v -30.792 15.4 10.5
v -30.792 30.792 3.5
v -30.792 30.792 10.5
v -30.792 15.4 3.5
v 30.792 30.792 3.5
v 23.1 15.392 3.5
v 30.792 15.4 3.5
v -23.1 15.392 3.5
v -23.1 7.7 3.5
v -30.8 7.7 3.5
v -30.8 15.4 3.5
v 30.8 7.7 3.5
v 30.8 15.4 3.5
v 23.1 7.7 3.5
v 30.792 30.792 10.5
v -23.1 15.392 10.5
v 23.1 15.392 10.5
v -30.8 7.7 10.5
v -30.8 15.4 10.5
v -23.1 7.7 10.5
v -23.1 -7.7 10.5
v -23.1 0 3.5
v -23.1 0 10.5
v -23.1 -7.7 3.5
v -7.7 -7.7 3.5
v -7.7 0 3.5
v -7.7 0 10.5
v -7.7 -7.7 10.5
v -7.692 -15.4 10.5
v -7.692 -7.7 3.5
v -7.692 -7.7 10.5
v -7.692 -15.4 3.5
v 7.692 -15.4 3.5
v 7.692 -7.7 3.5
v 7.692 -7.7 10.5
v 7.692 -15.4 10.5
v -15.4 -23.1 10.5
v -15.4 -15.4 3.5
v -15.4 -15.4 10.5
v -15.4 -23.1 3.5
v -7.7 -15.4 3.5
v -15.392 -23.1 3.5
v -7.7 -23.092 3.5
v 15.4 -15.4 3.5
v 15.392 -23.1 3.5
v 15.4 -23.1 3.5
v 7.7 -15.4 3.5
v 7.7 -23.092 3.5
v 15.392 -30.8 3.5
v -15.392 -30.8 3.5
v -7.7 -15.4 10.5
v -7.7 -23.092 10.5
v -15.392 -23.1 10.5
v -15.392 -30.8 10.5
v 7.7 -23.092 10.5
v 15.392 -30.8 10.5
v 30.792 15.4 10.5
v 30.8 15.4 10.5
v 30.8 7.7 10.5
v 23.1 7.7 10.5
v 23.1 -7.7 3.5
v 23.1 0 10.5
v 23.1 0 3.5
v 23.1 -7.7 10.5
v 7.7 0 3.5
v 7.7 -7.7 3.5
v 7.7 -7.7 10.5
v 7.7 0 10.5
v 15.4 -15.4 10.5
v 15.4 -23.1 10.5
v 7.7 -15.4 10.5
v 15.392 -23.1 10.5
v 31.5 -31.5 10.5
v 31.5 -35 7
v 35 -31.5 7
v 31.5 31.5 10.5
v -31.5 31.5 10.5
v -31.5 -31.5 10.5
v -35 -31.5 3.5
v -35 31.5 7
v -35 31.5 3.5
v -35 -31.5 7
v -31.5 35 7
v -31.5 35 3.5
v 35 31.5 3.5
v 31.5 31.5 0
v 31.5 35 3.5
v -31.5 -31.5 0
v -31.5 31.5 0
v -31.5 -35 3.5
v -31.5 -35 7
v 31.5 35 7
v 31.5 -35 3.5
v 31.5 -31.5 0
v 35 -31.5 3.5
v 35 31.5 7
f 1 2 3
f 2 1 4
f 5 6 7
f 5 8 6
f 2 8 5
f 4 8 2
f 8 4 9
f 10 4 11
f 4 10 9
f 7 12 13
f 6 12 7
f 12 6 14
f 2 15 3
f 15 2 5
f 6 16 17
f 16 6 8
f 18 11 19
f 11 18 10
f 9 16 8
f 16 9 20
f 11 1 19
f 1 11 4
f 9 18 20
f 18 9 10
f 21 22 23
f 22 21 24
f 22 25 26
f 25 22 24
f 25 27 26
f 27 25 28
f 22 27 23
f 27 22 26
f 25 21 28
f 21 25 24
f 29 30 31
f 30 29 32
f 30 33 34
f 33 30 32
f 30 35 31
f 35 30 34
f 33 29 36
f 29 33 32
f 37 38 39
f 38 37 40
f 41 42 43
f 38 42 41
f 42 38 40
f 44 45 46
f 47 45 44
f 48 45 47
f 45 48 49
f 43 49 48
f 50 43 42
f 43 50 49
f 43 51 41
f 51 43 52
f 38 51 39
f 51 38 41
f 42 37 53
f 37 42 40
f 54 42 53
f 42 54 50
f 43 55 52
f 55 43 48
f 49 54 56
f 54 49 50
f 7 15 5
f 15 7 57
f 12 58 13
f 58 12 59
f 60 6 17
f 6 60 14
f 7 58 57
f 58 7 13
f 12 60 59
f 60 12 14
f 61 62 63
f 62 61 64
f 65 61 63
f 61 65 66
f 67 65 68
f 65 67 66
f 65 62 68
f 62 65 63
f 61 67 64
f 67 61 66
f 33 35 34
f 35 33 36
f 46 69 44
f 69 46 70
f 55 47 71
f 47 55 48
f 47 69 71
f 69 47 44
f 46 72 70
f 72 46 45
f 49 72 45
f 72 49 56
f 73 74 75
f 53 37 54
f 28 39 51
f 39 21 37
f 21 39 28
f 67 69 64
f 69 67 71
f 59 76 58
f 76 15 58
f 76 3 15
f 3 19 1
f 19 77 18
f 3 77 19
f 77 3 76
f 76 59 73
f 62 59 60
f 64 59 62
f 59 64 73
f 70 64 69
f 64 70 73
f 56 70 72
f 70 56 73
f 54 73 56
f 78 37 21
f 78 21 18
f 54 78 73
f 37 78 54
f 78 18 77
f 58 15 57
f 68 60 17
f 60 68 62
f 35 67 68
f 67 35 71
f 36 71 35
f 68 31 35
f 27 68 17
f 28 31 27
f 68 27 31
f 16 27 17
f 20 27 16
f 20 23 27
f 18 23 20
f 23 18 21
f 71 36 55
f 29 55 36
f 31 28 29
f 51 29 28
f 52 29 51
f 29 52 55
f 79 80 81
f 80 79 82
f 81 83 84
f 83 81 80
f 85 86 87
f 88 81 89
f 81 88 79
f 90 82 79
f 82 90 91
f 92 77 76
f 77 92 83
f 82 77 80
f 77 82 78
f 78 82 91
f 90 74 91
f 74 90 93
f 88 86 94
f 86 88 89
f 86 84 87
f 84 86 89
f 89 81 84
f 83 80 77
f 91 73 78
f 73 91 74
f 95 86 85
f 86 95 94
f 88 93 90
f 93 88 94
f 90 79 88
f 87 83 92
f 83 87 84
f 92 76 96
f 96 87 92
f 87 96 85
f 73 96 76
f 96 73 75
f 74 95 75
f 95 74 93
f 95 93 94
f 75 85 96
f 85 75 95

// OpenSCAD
// file: common.scad
// Unless otherwise specified, each resulting shape is
// resting on the XY plane, centered on the Z axis.

// A small amount to make sure shapes overlap when needed. This
// is well below the resolution of my 3D printer, so it
// shouldn't affect the final result.
eps = 0.001;

// High quality for printing.
$fa = 5;
$fs = 0.4;

module repeatx(n, spacing) {
  for (i = [1:n])
    translate([(i-1)*spacing, 0, 0])
      children();
}

module repeaty(n, spacing) {
  for (i = [1:n])
    translate([0, (i-1)*spacing, 0])
      children();
}

// A square pyramid, 1mm wide and 0.5mm tall. Each side of
// the base is centered on an axis.
module pyramid() {
  linear_extrude(0.5, scale=0)
    square(1, center=true);
}

// A regular octahedron centered on the origin with its
// vertices on the axes. 'axis' gives its full length along
// each axis.
module octahedron(axis) {
  // Top and bottom halves.
  for (a = [-1, 1])
    scale([1, 1, a])
      // Extrude a square into a pyramid.
      linear_extrude(axis/2, scale=0)
        rotate([0, 0, 45])
          square(norm([axis/2, axis/2]), center=true);
}

// 'd' is the outer dimensions of the box.
module chamfered_box(d, chamfer=0.5) {
  assert(d.x >= chamfer*2);
  assert(d.y >= chamfer*2);
  assert(d.z >= chamfer*2);

  // Raise the result up so it is resting on the XY plane.
  translate([0, 0, d.z/2]) {
    minkowski() {
      // The desired cube, scaled back by the chamfer distance
      // in all directions.
      cube(d - [chamfer*2, chamfer*2, chamfer*2], center=true);
      octahedron(chamfer*2);
    }
  }
}

module chamfered_disk(height, radius) {
  // Chamfer base disks and chips more aggressively.
  chamfer = 1.1;
  assert(radius >= chamfer);
  assert(height >= chamfer*2);

  // Raise the result up so it is resting on the XY plane.
  translate([0, 0, height/2]) {
    minkowski() {
      // The desired disk, scaled back by the chamfer distance
      // in all directions.
      cylinder(height-chamfer*2, r=radius-chamfer, center=true);
      
      // A pair of cones.
      for (a = [-1, 1])
        scale([1, 1, a])
          linear_extrude(chamfer, scale=0)
            circle(chamfer);
    }
  }
}

locking_lug_dims = [2.3, 2.3, 1.8+2*eps];

// A snug fit for gluing.
module locking_lug() {
  // Taper the lug slightly, to counteract the printing effect
  // which spreads the top layer slightly.
  linear_extrude(locking_lug_dims.z, scale=0.95)
    square([locking_lug_dims.x, locking_lug_dims.y],
            center=true);
}

// Make extra sure the lug will fit all the way into the hole.
locking_socket_extra_depth = 0.7;

module locking_socket_top() {
  extra_depth = 0.15;
  translate([
    0, 0,
    -(
       locking_lug_dims.z+locking_socket_extra_depth+extra_depth
    )/2+eps
  ]) {
    cube(locking_lug_dims + [
      0.15, 0.15,
      locking_socket_extra_depth+extra_depth
    ], center=true);
  }
}

module locking_socket_bottom() {
  translate([
    0, 0,
    (locking_lug_dims.z+locking_socket_extra_depth)/2-eps
  ]) {
    cube(locking_lug_dims + [
      // When printing this on the bottom of a model, it
      // needs to be a bit wider to account for
      // elephant-foot.
      0.3, 0.3,
      locking_socket_extra_depth
    ], center=true);
  }
}

// A pin which can be used to join two locking sockets.
module locking_pin() {
  dims = [
    locking_lug_dims.x-0.2,
    // Lay the pin on its side for more reliable printing.
    locking_lug_dims.z*2 + locking_socket_extra_depth/2,
    locking_lug_dims.y-0.2,
  ];
  translate([0, 0, dims.z/2]) {
    difference() {
      cube(dims, center=true);
      
      // A slight bottom chamfer to combat elephant-foot.
      for (a = [-1, 1])
        scale([a, 1, 1])
          translate([dims.x/2, -eps, -dims.z/2-1.3])
            rotate([0, 45, 0])
              cube([dims.x, dims.y+3*eps, dims.z], center=true);
    }
  }
}

// Arranges children in square pattern.
module arrange(spacing) {
  s = ceil(sqrt($children));
  for (a = [0:s-1], b = [0:s-1]) {
    c = a + b*s;
    x = a - s/2 + 0.5;
    y = b - s/2 + 0.5;
    if (c < $children)
      translate([x*spacing, y*spacing, 0])
        children(c);
  }
}
// main file
include <common.scad>

side = 100;
engrave = 10;

module question_mark() {
  translate([0, -3, 0]) {
    polygon([
      [-7, -10],
      [-7, 0],
      [0, 8],
      [10, 8],
      [10, 18],
      [-10, 18],
      [-12, 16],
      [-12, 10],
      [-22, 10],
      [-22, 22],
      [-14, 30],
      [15, 30],
      [22, 22],
      [22, 6],
      [14, -2],
      [9, -2],
      [7, -4],
      [7, -10],
    ]);
    polygon([
      [-7, -26],
      [-7, -16],
      [7, -16],
      [7, -26],
    ]);
  }

  // Studs around question mark.
  for (a = [-1, 1], b = [-1, 1])
    scale([a, b, 1])
      translate([37, 37, 0])
        circle(5);
}

module big_j() {
  offset(0.2)
    text("J", 70, "Bookman");
}

eps = 0.01;

scale(0.7 * [1, 1, 1]) {
  difference() {
    chamfered_box([side, side, 15], chamfer=5);

    translate([0, 0, 5]) {
      for (a = [-1, 1]) {
        scale(1.1*[a, 1, 1]) {
          // Hair.
          translate([-eps, 20-eps, 0]) cube([40, 20, 20]);
          translate([30, 10, 0]) cube([10, 10, 20]);
          // Eyes.
          translate([10, -10, 0]) cube([20, 10, 20]);
          // Nose.
          translate([-eps, -20, 0]) cube([10, 10, 20]);
          // Mouth.
          translate([10, -30, 0]) cube([10, 10, 20]);
          translate([-eps, -40, 0]) cube([20, 10+eps, 20]);
        }
      }
    }
  }
}
